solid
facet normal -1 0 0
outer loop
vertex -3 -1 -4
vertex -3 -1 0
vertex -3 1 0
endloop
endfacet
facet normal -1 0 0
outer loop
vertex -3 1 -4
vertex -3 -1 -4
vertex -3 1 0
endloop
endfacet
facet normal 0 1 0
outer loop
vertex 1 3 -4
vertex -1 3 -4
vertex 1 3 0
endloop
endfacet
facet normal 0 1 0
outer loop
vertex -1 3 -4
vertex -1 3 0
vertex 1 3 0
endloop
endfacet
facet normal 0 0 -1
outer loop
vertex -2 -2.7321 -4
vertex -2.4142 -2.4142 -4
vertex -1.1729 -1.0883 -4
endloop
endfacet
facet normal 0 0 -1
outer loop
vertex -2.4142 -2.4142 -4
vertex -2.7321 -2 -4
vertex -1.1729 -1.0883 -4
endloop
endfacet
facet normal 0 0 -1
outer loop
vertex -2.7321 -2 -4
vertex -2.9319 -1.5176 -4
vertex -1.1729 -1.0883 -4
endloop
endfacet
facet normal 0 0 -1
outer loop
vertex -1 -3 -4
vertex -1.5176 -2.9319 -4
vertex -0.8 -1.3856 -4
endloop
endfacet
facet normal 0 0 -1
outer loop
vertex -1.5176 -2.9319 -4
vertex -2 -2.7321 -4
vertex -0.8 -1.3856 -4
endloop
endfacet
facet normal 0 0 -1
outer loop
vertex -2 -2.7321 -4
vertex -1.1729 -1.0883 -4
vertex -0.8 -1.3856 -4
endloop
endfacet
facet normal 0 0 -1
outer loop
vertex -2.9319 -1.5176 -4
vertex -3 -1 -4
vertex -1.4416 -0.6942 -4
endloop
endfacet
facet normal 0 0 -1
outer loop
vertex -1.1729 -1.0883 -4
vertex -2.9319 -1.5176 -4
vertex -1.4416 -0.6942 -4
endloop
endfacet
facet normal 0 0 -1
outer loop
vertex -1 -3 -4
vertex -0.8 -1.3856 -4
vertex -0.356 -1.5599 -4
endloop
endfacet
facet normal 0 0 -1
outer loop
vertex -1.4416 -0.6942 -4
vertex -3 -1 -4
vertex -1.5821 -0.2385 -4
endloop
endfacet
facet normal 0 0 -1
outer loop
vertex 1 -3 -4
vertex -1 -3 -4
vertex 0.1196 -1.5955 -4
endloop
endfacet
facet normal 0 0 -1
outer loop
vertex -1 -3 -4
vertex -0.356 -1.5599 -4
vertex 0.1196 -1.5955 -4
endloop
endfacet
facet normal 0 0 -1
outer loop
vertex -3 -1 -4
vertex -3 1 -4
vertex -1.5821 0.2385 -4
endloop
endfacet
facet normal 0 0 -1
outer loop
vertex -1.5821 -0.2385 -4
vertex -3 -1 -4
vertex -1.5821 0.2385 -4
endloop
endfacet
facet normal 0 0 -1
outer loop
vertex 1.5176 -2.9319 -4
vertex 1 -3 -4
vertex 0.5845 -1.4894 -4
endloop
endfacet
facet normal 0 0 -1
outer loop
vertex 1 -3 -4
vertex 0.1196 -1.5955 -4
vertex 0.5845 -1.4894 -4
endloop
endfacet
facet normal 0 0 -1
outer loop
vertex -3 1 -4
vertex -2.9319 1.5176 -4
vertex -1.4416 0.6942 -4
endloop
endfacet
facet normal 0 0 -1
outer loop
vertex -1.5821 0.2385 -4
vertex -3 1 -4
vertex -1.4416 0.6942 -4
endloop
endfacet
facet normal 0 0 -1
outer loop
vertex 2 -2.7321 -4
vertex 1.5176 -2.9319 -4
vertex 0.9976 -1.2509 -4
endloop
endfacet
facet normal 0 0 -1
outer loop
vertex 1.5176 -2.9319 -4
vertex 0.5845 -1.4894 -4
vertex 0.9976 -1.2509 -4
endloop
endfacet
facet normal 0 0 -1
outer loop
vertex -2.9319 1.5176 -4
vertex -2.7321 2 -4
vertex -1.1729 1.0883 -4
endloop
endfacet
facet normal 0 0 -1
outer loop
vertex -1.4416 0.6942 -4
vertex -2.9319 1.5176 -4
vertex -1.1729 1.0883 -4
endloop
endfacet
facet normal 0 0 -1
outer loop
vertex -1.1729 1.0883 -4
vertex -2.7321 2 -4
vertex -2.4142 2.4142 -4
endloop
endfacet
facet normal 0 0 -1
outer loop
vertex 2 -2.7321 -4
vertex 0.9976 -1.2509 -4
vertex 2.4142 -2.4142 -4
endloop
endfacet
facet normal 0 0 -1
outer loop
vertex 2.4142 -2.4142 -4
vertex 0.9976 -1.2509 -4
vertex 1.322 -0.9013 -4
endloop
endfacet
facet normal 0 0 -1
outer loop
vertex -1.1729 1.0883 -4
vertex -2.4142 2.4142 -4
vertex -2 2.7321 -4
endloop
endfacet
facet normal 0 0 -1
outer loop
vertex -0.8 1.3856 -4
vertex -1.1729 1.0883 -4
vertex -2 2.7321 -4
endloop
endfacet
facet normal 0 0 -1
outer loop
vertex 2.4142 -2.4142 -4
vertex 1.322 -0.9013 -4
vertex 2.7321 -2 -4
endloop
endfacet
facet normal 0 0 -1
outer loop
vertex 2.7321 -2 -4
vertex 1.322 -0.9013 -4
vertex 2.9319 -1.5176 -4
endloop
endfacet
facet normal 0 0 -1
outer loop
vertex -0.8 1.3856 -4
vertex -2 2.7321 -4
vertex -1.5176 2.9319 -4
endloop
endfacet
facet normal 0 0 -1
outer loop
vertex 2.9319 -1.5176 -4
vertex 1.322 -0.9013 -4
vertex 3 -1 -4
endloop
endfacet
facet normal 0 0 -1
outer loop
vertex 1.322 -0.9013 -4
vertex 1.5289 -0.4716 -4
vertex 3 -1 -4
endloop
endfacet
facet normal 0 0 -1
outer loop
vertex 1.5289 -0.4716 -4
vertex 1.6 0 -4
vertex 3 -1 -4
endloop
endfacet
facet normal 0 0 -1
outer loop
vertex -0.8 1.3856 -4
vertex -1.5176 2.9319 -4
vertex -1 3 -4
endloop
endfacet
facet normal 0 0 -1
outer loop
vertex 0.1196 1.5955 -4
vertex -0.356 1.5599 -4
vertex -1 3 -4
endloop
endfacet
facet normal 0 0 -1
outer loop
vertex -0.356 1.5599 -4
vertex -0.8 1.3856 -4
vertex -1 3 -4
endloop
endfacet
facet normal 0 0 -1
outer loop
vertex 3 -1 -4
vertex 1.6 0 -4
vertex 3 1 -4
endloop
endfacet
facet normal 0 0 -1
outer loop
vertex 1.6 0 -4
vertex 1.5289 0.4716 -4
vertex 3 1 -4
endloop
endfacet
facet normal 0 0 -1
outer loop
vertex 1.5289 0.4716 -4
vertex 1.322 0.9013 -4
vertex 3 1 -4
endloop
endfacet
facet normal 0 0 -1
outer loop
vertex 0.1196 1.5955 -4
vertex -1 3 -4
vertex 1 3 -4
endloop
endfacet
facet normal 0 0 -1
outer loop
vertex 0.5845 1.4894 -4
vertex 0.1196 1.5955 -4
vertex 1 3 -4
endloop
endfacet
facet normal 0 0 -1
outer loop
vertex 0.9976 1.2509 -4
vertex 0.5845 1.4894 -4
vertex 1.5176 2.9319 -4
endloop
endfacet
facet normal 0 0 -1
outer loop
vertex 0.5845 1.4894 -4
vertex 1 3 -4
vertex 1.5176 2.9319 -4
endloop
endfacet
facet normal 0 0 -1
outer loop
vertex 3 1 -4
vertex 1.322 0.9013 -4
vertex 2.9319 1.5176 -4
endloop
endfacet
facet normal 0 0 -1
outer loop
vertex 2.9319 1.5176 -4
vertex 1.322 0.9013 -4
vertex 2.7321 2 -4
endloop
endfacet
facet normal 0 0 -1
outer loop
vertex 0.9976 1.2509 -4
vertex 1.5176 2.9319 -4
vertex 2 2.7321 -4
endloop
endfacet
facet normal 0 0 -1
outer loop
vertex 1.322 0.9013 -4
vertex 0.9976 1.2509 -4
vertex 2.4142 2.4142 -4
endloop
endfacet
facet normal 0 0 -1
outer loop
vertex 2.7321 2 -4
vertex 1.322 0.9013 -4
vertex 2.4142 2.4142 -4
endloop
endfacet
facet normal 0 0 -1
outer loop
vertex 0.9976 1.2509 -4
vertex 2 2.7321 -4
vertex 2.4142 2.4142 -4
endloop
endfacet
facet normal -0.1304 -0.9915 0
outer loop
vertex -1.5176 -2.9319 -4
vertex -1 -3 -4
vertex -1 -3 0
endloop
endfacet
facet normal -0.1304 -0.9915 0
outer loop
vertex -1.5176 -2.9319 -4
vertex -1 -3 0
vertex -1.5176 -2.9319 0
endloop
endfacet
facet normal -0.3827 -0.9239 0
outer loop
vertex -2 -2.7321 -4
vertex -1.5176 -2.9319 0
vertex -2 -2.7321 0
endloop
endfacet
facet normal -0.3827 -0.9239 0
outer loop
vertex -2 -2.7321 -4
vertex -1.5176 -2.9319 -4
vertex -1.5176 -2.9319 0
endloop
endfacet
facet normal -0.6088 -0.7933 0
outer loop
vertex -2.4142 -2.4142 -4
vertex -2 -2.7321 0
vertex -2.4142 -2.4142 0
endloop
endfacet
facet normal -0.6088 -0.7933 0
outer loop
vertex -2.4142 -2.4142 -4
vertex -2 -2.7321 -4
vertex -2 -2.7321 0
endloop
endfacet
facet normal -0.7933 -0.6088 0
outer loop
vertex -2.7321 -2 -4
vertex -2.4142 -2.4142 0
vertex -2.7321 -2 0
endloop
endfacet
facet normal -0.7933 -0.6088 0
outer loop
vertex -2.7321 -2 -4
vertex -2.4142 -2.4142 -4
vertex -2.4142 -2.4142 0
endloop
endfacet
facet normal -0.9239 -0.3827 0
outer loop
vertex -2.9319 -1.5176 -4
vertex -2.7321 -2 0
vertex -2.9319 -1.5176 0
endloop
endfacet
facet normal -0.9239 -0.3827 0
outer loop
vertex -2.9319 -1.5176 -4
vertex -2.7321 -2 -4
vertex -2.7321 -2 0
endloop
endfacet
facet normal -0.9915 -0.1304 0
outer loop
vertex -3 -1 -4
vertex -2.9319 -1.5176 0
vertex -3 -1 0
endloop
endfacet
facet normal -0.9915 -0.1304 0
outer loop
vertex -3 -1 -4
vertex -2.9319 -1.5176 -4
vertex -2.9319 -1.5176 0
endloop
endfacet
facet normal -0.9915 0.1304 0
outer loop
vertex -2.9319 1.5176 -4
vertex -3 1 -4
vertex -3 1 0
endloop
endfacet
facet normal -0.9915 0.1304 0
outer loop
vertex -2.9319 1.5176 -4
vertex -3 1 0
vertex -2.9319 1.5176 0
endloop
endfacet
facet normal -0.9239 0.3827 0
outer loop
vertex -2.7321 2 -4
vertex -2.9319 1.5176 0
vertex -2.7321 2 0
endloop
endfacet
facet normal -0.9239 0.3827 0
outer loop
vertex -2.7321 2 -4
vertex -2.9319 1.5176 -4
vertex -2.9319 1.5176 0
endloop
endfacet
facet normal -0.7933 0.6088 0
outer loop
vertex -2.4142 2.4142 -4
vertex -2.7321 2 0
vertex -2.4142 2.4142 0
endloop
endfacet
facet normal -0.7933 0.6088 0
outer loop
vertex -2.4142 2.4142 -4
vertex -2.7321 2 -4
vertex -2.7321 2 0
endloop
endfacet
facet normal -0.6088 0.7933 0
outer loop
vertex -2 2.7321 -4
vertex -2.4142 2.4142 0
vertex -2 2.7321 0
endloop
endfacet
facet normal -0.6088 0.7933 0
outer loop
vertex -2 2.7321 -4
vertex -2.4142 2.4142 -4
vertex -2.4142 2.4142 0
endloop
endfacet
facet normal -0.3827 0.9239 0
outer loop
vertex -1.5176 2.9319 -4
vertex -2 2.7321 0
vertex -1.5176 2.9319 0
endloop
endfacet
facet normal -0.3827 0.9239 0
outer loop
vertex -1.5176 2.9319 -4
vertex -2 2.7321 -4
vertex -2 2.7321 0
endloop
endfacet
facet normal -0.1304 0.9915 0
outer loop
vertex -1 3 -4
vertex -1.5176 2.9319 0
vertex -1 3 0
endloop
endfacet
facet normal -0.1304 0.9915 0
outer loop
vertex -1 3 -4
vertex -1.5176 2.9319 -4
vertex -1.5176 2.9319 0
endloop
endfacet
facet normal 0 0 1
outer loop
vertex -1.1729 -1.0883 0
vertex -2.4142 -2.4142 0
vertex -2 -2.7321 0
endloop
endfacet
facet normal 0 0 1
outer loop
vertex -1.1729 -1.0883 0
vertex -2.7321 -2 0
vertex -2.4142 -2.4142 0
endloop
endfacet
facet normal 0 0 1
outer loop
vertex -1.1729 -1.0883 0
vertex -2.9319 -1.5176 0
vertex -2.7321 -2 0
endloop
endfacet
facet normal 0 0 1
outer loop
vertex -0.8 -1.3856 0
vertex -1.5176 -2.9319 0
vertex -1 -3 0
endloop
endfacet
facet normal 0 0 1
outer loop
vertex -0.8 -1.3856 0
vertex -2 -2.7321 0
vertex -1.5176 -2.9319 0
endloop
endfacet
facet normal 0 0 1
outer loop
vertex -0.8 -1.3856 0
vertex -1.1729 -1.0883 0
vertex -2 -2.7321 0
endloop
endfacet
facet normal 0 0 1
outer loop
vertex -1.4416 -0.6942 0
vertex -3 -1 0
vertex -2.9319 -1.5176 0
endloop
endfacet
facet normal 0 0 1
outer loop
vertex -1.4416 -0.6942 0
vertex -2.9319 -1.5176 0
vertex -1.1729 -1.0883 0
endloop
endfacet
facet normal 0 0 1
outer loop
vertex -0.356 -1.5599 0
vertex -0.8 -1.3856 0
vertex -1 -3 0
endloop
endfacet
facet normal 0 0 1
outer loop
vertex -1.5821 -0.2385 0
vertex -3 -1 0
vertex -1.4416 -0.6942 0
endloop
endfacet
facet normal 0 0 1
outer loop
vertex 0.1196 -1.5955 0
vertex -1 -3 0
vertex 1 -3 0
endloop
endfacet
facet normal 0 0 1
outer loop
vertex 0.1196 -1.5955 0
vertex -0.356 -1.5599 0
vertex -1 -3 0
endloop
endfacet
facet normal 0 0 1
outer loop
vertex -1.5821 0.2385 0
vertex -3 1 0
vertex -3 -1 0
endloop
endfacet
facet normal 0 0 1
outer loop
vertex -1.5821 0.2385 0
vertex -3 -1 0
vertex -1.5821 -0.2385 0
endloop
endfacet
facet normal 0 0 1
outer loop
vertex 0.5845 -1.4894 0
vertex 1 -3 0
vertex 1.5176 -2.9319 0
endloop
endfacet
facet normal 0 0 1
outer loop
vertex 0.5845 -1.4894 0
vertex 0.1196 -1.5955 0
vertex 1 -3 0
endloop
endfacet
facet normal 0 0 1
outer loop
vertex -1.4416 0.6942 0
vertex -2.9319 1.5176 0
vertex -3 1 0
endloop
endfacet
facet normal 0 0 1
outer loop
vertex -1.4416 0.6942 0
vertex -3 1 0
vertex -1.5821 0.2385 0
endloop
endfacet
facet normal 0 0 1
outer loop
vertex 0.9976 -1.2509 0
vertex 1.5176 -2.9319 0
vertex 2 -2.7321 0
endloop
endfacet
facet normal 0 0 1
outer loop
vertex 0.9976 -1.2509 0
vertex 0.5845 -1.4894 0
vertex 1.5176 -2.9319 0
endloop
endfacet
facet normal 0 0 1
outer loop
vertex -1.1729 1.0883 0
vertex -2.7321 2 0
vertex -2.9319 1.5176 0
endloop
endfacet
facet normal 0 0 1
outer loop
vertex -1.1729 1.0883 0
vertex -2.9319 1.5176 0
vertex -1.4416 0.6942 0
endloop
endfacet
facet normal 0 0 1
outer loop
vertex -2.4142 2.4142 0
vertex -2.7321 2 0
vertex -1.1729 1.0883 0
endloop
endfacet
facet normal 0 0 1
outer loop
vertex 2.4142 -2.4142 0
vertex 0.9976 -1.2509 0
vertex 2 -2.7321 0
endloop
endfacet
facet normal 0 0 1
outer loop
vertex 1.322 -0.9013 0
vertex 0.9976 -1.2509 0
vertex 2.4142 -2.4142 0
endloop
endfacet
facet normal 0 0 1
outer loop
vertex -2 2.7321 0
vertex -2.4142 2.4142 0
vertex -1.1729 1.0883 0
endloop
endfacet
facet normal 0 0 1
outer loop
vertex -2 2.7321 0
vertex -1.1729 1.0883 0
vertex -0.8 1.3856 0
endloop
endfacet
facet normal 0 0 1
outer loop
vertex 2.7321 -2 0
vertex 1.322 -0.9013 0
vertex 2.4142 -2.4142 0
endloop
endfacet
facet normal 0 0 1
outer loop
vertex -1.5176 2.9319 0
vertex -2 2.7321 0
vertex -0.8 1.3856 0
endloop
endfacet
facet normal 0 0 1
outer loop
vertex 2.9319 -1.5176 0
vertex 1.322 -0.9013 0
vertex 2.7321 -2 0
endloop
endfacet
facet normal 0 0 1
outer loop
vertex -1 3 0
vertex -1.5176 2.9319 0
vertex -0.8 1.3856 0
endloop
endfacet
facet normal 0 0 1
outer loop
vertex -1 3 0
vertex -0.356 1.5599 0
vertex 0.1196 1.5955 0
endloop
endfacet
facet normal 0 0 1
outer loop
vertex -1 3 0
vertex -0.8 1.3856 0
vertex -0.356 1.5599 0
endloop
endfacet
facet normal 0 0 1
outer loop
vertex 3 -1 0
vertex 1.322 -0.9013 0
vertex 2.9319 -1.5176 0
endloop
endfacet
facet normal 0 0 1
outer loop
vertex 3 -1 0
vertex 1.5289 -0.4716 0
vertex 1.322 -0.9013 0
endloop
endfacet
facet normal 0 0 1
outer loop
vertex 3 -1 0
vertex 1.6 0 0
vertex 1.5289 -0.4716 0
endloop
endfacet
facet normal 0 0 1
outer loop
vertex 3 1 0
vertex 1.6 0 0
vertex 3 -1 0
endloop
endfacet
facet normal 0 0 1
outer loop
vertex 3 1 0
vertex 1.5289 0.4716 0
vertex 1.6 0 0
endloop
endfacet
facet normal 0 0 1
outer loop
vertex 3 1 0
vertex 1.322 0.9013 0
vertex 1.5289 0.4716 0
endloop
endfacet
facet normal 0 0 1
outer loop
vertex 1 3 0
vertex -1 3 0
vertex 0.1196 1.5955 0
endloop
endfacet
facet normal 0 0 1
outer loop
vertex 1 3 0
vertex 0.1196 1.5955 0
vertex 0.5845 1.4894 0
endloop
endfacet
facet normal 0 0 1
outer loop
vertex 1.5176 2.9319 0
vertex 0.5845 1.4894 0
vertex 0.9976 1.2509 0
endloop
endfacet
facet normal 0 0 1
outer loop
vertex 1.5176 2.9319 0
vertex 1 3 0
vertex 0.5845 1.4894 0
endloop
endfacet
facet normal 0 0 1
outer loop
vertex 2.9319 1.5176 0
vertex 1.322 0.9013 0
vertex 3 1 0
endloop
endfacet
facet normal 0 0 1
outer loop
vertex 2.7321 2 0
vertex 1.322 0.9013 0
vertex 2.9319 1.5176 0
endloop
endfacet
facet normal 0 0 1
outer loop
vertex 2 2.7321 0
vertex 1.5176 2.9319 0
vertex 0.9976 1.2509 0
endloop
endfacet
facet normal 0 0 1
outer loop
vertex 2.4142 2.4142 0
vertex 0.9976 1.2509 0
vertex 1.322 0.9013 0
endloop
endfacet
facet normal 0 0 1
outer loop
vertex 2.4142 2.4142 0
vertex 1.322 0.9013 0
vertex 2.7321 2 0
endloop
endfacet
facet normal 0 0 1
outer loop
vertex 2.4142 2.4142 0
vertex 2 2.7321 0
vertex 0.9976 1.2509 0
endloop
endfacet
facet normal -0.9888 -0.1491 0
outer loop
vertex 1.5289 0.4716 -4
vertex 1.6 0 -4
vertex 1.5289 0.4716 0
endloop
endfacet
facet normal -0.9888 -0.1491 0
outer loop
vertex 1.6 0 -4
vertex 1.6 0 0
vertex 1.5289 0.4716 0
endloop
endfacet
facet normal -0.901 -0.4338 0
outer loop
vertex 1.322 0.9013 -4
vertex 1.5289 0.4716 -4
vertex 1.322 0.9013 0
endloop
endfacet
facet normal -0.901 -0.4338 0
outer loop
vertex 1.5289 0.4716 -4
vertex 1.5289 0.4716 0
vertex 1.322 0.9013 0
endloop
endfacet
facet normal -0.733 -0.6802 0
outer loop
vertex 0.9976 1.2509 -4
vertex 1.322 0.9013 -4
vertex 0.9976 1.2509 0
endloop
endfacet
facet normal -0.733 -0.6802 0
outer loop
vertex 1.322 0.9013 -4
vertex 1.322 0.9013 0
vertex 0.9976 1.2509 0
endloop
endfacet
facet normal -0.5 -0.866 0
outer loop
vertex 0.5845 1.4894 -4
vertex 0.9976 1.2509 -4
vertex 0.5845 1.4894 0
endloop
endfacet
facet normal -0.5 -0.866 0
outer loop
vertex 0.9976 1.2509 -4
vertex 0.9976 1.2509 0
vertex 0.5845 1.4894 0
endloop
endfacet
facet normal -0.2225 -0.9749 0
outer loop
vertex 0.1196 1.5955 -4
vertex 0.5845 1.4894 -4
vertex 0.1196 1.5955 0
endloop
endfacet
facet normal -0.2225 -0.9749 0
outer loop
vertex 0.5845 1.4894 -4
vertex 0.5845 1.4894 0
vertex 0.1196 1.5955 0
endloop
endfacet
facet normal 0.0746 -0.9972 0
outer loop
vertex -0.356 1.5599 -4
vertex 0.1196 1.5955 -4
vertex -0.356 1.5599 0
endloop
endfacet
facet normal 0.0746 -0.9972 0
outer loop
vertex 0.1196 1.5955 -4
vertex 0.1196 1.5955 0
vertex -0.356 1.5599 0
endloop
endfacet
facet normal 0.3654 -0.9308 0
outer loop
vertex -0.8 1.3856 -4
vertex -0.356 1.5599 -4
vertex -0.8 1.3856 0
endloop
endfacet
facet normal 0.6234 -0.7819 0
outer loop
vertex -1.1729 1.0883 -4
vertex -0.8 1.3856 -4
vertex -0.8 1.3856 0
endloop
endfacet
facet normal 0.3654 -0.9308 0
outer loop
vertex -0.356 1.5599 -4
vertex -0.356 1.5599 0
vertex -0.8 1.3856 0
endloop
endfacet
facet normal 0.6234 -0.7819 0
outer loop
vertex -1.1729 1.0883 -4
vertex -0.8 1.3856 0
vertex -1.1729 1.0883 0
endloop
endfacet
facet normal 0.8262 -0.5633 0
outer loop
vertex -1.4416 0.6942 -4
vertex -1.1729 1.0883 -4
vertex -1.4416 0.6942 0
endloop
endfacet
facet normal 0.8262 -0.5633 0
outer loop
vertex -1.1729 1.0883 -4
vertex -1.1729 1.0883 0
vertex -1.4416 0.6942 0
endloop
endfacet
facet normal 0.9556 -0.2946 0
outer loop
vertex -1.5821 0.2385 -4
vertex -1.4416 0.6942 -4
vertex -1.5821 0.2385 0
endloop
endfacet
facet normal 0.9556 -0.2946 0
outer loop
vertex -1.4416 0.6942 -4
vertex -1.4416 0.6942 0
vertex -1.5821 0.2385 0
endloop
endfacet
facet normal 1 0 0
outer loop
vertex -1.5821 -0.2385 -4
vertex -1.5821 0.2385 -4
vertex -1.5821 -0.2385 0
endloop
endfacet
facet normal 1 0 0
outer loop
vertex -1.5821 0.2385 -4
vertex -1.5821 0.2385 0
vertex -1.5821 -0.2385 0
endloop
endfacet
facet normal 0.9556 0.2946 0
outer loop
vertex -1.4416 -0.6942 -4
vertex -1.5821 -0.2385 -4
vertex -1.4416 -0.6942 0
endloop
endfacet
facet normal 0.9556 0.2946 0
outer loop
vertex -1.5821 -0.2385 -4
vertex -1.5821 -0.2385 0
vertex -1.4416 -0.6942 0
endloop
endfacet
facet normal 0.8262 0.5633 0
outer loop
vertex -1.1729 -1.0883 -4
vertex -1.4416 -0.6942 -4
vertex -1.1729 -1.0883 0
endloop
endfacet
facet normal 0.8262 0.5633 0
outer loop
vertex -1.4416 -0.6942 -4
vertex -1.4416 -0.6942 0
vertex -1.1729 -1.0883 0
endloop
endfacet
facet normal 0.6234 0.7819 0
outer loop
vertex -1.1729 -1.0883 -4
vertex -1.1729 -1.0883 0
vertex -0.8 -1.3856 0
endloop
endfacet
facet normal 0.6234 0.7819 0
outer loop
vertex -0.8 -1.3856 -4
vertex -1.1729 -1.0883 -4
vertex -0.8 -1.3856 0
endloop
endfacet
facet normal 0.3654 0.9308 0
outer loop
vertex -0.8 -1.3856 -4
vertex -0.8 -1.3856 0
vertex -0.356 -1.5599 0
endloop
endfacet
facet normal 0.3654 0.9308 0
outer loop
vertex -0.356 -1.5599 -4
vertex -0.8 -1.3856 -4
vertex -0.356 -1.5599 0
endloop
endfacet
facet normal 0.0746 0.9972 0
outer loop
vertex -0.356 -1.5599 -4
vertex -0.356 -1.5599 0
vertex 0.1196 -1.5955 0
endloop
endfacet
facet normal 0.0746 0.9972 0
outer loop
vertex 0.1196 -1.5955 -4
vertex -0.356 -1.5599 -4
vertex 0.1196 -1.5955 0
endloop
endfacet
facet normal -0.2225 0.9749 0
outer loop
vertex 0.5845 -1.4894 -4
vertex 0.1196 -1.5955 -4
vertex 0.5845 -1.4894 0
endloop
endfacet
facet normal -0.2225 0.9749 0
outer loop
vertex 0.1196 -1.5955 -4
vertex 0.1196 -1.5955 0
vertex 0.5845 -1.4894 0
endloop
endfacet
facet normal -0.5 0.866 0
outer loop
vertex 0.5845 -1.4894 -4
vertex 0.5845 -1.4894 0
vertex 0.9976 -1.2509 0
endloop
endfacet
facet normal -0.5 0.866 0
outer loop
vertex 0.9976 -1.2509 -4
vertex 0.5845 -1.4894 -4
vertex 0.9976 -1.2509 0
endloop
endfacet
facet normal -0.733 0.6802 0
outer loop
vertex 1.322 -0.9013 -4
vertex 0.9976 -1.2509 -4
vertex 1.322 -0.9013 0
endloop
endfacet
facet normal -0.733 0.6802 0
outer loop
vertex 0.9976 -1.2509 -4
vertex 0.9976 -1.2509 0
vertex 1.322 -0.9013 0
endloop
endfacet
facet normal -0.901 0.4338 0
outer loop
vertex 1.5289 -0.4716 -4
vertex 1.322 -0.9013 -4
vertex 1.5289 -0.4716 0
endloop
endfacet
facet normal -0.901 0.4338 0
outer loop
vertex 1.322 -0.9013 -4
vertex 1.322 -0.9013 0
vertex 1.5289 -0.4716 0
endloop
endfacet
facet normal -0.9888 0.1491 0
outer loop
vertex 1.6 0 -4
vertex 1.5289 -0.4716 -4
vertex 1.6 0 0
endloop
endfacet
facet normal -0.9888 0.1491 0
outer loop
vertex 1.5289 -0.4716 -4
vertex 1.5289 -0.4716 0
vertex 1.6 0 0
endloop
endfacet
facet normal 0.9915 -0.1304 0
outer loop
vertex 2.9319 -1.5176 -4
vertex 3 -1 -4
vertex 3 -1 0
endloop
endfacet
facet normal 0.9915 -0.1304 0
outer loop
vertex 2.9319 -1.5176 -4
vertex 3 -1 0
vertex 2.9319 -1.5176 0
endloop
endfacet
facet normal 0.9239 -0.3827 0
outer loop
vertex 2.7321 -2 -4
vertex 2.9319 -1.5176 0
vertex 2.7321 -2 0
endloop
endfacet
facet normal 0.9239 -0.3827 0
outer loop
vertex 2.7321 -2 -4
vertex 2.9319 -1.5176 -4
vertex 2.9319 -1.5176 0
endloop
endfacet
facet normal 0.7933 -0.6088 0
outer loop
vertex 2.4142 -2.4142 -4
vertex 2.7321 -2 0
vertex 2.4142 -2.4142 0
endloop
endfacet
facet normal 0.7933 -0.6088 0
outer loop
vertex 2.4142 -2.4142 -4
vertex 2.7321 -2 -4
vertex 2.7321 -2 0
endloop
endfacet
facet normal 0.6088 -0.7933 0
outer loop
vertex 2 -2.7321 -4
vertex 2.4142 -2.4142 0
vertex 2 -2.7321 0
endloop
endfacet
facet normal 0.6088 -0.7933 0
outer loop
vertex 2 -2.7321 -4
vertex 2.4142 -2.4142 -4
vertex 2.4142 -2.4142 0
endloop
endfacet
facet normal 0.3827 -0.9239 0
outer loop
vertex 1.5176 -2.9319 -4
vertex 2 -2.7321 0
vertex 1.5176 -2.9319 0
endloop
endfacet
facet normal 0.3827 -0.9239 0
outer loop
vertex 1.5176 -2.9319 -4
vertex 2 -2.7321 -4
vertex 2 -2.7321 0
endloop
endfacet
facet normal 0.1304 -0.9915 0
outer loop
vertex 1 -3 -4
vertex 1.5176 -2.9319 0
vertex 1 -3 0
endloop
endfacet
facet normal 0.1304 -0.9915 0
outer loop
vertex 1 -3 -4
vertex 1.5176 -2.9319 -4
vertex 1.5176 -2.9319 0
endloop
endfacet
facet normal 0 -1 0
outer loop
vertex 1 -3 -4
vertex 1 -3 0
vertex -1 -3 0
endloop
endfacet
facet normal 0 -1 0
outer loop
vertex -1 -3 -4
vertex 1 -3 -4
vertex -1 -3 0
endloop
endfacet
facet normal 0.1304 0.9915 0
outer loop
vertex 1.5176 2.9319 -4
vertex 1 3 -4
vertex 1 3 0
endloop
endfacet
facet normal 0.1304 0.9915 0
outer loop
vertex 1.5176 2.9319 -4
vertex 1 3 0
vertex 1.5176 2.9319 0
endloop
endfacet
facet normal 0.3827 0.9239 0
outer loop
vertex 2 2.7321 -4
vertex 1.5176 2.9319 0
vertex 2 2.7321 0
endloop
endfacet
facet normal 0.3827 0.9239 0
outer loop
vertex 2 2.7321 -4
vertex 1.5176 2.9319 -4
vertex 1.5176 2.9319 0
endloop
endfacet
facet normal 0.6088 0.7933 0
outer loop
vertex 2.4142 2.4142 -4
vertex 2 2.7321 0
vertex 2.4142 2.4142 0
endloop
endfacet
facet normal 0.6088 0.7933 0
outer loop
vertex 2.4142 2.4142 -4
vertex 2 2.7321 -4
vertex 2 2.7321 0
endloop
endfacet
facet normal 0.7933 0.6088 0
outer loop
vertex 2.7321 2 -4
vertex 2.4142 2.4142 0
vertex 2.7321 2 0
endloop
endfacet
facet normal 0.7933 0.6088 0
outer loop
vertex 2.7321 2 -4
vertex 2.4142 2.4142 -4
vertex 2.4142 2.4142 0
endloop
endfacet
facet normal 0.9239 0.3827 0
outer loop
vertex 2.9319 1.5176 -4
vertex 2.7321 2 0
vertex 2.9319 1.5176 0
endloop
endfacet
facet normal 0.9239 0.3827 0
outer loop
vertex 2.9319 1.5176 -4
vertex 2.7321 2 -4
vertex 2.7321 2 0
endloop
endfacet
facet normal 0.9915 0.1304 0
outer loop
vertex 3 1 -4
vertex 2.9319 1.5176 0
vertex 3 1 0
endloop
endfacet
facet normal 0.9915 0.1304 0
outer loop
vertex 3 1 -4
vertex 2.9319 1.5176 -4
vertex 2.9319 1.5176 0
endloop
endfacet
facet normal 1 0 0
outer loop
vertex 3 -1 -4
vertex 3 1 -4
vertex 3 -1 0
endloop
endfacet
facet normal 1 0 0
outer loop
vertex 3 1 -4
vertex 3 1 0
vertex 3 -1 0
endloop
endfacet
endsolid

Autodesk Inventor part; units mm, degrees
ref_plane "YZ Plane" through (0, 0, 0) normal (1, 0, 0) x (0, 1, 0)
ref_plane "XZ Plane" through (0, 0, 0) normal (0, 1, 0) x (-1, 0, 0)
ref_plane "XY Plane" through (0, 0, 0) normal (0, 0, 1) x (1, 0, 0)
sketch "Boceto1" plane through (0, 0, 0) normal (0, 0, 1) x (1, 0, 0)
  circle A0 centre (0, 0) radius 1.4 construction
  circle A1 centre (0, 0) radius 1.6
  line L0 (-3, 3) -> (3, 3)
  line L1 (3, 3) -> (3, -3)
  line L2 (3, -3) -> (-3, -3)
  line L3 (-3, -3) -> (-3, 3)
  line L4 (-3, 3) -> (3, -3) construction
  line L5 (3, 3) -> (-3, -3) construction
  point P0 (0, 0)
  point P1 (0, -3)
  dimension "d0" = 0.2
  dimension "d1" = 3
  dimension "d2" = 3
extrude "Extrusión1" add sketch "Boceto1" against normal blind 4
fillet "Empalme1" radius 2 4 edges at (3, -3, -2) (-3, -3, -2) (-3, 3, -2) (3, 3, -2)
properties part number "TapónEje"
